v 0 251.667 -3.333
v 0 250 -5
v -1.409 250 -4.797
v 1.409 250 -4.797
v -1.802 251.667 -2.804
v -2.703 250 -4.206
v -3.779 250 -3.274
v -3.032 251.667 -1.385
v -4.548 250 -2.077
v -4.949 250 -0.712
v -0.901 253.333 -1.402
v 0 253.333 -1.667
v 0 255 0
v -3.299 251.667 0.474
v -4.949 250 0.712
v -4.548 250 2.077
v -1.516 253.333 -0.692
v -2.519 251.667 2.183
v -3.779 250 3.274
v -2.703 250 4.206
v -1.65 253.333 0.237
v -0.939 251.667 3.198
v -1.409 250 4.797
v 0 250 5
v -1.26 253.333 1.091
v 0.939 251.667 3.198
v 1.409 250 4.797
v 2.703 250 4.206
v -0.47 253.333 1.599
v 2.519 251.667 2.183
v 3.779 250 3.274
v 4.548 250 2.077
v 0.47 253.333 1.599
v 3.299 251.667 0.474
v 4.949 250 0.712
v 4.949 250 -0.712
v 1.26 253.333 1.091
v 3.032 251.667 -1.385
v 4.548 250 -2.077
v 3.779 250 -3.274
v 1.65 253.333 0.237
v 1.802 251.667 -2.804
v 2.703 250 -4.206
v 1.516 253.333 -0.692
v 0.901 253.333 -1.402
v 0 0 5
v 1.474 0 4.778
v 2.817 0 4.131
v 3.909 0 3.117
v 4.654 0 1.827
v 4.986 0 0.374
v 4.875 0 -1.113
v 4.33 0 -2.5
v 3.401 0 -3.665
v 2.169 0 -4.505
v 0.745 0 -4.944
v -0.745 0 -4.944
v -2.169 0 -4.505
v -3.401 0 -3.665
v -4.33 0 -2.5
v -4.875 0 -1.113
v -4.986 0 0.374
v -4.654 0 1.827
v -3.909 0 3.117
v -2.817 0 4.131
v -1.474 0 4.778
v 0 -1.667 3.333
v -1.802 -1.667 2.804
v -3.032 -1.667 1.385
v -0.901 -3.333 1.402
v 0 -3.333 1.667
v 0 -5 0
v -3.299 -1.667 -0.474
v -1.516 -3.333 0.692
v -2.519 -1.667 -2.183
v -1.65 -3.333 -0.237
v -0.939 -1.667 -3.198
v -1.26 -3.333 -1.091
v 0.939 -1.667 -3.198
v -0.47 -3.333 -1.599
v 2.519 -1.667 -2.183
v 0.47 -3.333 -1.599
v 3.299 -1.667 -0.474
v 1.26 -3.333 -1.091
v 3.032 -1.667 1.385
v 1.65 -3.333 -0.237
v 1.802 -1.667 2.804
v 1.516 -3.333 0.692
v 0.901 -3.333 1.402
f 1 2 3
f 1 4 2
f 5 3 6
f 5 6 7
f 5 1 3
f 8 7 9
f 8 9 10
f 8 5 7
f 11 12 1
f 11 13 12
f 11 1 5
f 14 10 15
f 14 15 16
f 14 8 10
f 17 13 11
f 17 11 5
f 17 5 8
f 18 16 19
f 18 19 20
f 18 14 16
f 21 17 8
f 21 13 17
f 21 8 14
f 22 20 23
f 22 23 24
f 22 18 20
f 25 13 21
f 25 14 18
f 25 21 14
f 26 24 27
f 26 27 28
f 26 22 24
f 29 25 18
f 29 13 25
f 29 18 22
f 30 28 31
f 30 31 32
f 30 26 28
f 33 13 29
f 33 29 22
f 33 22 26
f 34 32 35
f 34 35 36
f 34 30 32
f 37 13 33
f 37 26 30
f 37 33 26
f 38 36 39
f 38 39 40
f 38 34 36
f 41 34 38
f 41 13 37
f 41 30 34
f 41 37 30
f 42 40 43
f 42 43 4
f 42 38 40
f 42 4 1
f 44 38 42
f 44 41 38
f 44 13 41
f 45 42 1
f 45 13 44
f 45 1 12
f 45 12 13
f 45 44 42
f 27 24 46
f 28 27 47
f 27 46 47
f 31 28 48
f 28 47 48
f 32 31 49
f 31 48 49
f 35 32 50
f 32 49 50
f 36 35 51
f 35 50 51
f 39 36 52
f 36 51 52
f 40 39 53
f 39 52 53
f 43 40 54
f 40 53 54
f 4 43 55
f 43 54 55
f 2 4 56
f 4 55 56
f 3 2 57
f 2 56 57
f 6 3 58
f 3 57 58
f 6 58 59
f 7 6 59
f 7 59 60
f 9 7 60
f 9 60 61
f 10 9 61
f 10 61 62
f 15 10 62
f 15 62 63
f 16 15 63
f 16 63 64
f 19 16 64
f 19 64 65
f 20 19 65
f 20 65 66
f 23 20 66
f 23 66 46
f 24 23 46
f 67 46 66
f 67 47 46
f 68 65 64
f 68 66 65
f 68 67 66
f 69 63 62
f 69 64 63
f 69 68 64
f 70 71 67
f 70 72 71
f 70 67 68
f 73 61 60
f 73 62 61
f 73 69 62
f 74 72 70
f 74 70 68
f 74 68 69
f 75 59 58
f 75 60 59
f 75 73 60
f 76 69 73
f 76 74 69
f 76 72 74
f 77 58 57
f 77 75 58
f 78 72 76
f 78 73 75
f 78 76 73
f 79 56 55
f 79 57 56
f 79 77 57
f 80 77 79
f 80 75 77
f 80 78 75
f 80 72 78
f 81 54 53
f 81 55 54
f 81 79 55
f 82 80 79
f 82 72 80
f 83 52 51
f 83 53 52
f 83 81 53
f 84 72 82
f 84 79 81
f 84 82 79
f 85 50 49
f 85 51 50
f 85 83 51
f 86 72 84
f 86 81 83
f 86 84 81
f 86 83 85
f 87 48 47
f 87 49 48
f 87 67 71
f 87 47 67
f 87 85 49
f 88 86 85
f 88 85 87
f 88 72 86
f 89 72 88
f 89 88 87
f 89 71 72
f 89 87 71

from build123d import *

# Parameters (mm, degrees)
CROQUIS1_R              = 5
SALIENTE_EXTRUIR1_DEPTH = 250


with BuildPart() as part:
    # Croquis1 → Saliente-Extruir1 (new body)
    with BuildSketch(Plane(origin=(0, 0, 0), x_dir=(1, 0, 0), z_dir=(0, 1, 0))):
        Circle(CROQUIS1_R)
    extrude(amount=SALIENTE_EXTRUIR1_DEPTH)

    # Saliente-Extruir2 cone 1 section (through the dimple's axis) → Saliente-Extruir2 (revolve)
    with BuildSketch(Plane(origin=(0, 250, 0), x_dir=(0, 0, -1), z_dir=(1, 0, 0))):
        Polygon((0, 0), (5, 0), (0, 5), align=None)
    revolve(axis=Axis((0, 250, 0), (0, 1, 0)))

    # Saliente-Extruir3 cone 1 section (through the dimple's axis) → Saliente-Extruir3 (revolve)
    with BuildSketch(Plane(origin=(0, 0, 0), x_dir=(0, 0, 1), z_dir=(1, 0, 0))):
        Polygon((0, 0), (5, 0), (0, 5), align=None)
    revolve(axis=Axis((0, 0, 0), (0, -1, 0)))


solid = part.part
